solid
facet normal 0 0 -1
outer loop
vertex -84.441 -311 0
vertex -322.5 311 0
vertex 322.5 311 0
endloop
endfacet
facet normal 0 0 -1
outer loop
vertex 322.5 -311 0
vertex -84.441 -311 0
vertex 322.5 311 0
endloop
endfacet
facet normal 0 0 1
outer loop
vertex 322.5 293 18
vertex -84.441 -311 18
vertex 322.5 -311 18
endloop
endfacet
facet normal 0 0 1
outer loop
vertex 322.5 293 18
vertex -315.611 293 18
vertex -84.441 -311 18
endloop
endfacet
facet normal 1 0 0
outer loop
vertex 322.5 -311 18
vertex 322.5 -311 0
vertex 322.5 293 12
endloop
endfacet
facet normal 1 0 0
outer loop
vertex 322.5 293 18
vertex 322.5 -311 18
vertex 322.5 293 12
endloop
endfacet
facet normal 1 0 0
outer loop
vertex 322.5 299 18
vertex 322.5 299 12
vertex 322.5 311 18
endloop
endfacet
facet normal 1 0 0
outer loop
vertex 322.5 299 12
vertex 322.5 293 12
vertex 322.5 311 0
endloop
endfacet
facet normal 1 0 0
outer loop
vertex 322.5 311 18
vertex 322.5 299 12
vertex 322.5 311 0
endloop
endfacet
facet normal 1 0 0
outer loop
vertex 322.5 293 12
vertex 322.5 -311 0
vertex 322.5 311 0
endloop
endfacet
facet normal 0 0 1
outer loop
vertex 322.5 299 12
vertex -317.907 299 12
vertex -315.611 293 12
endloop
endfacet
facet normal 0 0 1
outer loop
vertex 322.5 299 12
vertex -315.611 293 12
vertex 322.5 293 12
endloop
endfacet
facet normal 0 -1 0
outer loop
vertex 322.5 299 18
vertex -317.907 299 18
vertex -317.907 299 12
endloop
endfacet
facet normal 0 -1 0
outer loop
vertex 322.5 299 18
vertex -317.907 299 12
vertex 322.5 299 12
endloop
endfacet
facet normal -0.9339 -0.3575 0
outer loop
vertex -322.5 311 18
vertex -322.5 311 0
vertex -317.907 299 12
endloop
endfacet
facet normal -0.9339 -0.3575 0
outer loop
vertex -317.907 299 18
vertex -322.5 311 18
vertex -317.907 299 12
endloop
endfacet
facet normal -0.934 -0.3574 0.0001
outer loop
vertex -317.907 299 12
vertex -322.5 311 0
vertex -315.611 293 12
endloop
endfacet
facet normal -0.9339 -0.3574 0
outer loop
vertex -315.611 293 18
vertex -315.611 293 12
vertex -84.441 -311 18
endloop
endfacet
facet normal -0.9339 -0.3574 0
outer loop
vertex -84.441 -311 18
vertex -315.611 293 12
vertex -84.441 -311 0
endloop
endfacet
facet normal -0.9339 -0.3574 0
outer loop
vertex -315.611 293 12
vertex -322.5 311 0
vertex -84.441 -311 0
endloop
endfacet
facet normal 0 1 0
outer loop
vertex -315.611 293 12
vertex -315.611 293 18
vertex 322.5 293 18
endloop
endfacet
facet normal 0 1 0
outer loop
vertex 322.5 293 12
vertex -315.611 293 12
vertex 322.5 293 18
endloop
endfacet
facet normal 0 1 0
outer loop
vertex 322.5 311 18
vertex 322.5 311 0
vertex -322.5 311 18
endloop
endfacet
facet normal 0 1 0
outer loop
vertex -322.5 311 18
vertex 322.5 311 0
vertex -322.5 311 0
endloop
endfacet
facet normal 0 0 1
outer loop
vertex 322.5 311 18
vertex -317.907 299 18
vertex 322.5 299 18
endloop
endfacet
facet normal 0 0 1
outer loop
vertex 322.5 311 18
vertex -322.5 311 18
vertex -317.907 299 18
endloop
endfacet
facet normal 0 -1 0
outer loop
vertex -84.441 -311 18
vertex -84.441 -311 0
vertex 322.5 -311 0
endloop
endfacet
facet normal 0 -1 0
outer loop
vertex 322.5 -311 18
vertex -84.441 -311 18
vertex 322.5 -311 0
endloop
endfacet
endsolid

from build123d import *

# Parameters (mm, degrees)
F1_DEPTH = 18
F2_W     = 640.407225
F2_H     = 6
F3_DEPTH = 6


with BuildPart() as f1:
    # F0 (on Top) → F1 (new body)
    with BuildSketch(Plane.XY):
        Polygon((322.5, -311), (322.5, 311), (-322.5, 311), (-84.441184, -311), align=None)
    extrude(amount=F1_DEPTH)

    # F2 (on face) → F3 (cut)
    with BuildSketch(Plane.XY.offset(18)):
        with Locations((2.296388, 296)):
            Rectangle(F2_W, F2_H)
    extrude(amount=-F3_DEPTH, mode=Mode.SUBTRACT)


solid = f1.part
